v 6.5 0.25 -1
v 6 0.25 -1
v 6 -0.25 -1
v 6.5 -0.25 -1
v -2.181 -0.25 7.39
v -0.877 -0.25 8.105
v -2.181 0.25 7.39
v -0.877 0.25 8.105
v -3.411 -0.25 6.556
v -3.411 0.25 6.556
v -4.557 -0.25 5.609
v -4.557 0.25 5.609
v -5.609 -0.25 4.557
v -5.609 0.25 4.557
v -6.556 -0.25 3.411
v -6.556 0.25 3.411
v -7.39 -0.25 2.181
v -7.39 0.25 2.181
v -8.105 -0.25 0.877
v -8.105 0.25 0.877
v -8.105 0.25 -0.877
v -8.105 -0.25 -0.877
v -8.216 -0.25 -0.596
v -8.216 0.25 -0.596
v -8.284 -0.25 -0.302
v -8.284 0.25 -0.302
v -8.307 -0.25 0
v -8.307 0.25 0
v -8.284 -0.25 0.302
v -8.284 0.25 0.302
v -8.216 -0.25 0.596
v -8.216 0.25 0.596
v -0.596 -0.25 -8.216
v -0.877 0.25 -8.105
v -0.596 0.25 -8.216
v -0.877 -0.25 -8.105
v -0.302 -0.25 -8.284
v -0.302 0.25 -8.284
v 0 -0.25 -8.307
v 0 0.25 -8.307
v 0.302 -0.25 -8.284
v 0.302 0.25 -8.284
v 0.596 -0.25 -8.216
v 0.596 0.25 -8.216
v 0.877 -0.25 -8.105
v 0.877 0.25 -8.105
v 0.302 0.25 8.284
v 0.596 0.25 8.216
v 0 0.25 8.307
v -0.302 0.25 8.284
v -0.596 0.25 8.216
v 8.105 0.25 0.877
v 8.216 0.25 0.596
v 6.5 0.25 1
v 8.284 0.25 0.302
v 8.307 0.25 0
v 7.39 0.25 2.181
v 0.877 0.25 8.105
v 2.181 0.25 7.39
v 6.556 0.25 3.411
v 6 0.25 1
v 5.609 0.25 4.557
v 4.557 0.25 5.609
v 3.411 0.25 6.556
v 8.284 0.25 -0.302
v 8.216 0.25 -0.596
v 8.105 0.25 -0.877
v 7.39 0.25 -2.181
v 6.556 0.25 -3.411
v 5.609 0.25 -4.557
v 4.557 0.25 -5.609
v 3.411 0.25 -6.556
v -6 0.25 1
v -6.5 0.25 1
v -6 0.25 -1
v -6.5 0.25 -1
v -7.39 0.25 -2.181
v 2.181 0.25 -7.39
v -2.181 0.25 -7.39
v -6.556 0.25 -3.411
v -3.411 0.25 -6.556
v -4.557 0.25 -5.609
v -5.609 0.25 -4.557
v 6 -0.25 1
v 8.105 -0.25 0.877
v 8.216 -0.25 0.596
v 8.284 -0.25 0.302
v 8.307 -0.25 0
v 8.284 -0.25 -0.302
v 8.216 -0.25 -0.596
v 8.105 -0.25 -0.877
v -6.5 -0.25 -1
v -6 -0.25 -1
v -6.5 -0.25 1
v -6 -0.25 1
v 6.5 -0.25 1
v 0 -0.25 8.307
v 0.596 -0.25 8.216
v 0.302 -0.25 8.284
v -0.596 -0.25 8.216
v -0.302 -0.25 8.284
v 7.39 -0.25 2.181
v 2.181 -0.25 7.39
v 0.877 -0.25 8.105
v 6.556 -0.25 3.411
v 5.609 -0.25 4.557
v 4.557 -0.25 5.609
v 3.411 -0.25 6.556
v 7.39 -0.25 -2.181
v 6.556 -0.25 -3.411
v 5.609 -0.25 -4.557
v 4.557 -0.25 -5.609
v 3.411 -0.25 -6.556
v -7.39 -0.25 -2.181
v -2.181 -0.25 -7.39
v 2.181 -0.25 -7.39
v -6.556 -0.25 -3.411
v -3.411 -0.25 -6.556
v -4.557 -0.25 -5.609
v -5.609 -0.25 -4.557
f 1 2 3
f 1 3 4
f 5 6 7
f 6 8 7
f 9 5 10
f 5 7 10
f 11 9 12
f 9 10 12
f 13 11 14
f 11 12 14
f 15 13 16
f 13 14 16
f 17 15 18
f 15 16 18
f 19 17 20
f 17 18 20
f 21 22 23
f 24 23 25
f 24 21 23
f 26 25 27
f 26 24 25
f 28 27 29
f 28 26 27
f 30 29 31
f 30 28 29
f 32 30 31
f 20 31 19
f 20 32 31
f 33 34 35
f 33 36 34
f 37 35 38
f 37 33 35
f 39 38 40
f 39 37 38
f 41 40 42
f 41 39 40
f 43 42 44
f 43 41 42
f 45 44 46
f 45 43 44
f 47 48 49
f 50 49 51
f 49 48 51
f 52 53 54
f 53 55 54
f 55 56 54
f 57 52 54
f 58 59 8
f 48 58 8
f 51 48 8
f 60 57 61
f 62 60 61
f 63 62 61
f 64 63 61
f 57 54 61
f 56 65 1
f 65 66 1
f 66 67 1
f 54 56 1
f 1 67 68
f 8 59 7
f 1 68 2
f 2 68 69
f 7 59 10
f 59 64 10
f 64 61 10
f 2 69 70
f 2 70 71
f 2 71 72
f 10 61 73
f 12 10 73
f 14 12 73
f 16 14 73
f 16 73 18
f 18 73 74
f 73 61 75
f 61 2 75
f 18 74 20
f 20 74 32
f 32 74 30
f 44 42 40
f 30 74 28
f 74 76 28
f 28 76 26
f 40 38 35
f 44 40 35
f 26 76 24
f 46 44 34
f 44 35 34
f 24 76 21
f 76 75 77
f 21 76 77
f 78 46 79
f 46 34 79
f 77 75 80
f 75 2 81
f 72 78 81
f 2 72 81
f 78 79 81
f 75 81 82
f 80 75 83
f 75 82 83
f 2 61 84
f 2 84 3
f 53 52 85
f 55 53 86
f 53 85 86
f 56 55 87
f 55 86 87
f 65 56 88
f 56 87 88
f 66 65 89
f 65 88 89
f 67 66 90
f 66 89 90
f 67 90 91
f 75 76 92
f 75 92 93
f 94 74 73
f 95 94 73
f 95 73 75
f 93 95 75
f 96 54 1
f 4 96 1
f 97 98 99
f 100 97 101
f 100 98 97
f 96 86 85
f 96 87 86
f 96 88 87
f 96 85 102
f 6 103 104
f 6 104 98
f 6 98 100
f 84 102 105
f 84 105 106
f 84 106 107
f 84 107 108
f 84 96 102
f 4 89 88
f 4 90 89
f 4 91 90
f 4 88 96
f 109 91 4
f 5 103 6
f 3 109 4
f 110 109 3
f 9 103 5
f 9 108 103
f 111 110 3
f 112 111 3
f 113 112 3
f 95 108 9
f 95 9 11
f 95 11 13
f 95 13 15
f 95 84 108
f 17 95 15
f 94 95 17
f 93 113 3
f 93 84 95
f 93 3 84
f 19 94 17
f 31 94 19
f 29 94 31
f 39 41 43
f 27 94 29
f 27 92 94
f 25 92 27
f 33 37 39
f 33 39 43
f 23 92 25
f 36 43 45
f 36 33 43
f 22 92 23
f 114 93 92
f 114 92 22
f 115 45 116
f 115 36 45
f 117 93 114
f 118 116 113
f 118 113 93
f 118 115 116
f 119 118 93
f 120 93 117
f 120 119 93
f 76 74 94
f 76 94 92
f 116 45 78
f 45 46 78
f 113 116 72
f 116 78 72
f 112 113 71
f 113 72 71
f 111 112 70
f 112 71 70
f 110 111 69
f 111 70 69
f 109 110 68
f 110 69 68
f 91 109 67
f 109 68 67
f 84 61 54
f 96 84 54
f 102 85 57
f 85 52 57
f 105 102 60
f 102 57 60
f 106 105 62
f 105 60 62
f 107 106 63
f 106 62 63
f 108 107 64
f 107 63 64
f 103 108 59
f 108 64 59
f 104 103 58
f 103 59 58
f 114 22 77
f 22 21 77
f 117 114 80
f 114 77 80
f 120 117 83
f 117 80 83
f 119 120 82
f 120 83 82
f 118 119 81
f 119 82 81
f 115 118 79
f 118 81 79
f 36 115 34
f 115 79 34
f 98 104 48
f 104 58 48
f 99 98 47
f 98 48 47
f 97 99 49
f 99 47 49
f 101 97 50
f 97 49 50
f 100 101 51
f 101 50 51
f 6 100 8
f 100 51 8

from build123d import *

# Parameters (mm, degrees)
BOSS_EXTRUDE1_DEPTH = 0.25
FILLET1_R           = 2
CUT_EXTRUDE1_REACH  = 2.5
SKETCH2_W           = 0.5
SKETCH2_H           = 2


with BuildPart() as part:
    # Sketch1 → Boss-Extrude1 (new body, symmetric)
    with BuildSketch(Plane(origin=(0, 0, 0), x_dir=(1, 0, 0), z_dir=(0, 1, 0))):
        with BuildLine():
            ThreePointArc((-8.5, 0), (-5.095377561, 5.095377561), (0, 8.5))
            ThreePointArc((0, 8.5), (5.095377561, 5.095377561), (8.5, 0))
            ThreePointArc((8.5, 0), (5.095377561, -5.095377561), (0, -8.5))
            ThreePointArc((0, -8.5), (-5.095377561, -5.095377561), (-8.5, 0))
        make_face()
    extrude(amount=BOSS_EXTRUDE1_DEPTH, both=True)

    # Fillet1
    fillet1_edges = [part.edges().sort_by_distance(p)[0] for p in [
        (-8.5, 0, 0),
        (0, 0, -8.5),
        (8.5, 0, 0),
        (0, 0, 8.5),
    ]]
    fillet(fillet1_edges, radius=FILLET1_R)

    # Sketch2 → Cut-Extrude1 (cut, up to next)
    with BuildSketch(Plane(origin=(0, 0.25, 0), x_dir=(1, 0, 0), z_dir=(0, 1, 0)), mode=Mode.PRIVATE) as cut_extrude1_sk1:
        with Locations((-6.25, 0)):
            Rectangle(SKETCH2_W, SKETCH2_H)
    cut_extrude1_tool1 = extrude(cut_extrude1_sk1.sketch, amount=-CUT_EXTRUDE1_REACH, mode=Mode.PRIVATE) & part.part
    add(cut_extrude1_tool1.solids().sort_by_distance((-6.25, 0.25, 0))[0], mode=Mode.SUBTRACT)
    # Sketch2 → Cut-Extrude1 (cut, up to next)
    with BuildSketch(Plane(origin=(0, 0.25, 0), x_dir=(1, 0, 0), z_dir=(0, 1, 0)), mode=Mode.PRIVATE) as cut_extrude1_sk2:
        with Locations((6.25, 0)):
            Rectangle(SKETCH2_W, SKETCH2_H)
    cut_extrude1_tool2 = extrude(cut_extrude1_sk2.sketch, amount=-CUT_EXTRUDE1_REACH, mode=Mode.PRIVATE) & part.part
    add(cut_extrude1_tool2.solids().sort_by_distance((6.25, 0.25, 0))[0], mode=Mode.SUBTRACT)


solid = part.part
